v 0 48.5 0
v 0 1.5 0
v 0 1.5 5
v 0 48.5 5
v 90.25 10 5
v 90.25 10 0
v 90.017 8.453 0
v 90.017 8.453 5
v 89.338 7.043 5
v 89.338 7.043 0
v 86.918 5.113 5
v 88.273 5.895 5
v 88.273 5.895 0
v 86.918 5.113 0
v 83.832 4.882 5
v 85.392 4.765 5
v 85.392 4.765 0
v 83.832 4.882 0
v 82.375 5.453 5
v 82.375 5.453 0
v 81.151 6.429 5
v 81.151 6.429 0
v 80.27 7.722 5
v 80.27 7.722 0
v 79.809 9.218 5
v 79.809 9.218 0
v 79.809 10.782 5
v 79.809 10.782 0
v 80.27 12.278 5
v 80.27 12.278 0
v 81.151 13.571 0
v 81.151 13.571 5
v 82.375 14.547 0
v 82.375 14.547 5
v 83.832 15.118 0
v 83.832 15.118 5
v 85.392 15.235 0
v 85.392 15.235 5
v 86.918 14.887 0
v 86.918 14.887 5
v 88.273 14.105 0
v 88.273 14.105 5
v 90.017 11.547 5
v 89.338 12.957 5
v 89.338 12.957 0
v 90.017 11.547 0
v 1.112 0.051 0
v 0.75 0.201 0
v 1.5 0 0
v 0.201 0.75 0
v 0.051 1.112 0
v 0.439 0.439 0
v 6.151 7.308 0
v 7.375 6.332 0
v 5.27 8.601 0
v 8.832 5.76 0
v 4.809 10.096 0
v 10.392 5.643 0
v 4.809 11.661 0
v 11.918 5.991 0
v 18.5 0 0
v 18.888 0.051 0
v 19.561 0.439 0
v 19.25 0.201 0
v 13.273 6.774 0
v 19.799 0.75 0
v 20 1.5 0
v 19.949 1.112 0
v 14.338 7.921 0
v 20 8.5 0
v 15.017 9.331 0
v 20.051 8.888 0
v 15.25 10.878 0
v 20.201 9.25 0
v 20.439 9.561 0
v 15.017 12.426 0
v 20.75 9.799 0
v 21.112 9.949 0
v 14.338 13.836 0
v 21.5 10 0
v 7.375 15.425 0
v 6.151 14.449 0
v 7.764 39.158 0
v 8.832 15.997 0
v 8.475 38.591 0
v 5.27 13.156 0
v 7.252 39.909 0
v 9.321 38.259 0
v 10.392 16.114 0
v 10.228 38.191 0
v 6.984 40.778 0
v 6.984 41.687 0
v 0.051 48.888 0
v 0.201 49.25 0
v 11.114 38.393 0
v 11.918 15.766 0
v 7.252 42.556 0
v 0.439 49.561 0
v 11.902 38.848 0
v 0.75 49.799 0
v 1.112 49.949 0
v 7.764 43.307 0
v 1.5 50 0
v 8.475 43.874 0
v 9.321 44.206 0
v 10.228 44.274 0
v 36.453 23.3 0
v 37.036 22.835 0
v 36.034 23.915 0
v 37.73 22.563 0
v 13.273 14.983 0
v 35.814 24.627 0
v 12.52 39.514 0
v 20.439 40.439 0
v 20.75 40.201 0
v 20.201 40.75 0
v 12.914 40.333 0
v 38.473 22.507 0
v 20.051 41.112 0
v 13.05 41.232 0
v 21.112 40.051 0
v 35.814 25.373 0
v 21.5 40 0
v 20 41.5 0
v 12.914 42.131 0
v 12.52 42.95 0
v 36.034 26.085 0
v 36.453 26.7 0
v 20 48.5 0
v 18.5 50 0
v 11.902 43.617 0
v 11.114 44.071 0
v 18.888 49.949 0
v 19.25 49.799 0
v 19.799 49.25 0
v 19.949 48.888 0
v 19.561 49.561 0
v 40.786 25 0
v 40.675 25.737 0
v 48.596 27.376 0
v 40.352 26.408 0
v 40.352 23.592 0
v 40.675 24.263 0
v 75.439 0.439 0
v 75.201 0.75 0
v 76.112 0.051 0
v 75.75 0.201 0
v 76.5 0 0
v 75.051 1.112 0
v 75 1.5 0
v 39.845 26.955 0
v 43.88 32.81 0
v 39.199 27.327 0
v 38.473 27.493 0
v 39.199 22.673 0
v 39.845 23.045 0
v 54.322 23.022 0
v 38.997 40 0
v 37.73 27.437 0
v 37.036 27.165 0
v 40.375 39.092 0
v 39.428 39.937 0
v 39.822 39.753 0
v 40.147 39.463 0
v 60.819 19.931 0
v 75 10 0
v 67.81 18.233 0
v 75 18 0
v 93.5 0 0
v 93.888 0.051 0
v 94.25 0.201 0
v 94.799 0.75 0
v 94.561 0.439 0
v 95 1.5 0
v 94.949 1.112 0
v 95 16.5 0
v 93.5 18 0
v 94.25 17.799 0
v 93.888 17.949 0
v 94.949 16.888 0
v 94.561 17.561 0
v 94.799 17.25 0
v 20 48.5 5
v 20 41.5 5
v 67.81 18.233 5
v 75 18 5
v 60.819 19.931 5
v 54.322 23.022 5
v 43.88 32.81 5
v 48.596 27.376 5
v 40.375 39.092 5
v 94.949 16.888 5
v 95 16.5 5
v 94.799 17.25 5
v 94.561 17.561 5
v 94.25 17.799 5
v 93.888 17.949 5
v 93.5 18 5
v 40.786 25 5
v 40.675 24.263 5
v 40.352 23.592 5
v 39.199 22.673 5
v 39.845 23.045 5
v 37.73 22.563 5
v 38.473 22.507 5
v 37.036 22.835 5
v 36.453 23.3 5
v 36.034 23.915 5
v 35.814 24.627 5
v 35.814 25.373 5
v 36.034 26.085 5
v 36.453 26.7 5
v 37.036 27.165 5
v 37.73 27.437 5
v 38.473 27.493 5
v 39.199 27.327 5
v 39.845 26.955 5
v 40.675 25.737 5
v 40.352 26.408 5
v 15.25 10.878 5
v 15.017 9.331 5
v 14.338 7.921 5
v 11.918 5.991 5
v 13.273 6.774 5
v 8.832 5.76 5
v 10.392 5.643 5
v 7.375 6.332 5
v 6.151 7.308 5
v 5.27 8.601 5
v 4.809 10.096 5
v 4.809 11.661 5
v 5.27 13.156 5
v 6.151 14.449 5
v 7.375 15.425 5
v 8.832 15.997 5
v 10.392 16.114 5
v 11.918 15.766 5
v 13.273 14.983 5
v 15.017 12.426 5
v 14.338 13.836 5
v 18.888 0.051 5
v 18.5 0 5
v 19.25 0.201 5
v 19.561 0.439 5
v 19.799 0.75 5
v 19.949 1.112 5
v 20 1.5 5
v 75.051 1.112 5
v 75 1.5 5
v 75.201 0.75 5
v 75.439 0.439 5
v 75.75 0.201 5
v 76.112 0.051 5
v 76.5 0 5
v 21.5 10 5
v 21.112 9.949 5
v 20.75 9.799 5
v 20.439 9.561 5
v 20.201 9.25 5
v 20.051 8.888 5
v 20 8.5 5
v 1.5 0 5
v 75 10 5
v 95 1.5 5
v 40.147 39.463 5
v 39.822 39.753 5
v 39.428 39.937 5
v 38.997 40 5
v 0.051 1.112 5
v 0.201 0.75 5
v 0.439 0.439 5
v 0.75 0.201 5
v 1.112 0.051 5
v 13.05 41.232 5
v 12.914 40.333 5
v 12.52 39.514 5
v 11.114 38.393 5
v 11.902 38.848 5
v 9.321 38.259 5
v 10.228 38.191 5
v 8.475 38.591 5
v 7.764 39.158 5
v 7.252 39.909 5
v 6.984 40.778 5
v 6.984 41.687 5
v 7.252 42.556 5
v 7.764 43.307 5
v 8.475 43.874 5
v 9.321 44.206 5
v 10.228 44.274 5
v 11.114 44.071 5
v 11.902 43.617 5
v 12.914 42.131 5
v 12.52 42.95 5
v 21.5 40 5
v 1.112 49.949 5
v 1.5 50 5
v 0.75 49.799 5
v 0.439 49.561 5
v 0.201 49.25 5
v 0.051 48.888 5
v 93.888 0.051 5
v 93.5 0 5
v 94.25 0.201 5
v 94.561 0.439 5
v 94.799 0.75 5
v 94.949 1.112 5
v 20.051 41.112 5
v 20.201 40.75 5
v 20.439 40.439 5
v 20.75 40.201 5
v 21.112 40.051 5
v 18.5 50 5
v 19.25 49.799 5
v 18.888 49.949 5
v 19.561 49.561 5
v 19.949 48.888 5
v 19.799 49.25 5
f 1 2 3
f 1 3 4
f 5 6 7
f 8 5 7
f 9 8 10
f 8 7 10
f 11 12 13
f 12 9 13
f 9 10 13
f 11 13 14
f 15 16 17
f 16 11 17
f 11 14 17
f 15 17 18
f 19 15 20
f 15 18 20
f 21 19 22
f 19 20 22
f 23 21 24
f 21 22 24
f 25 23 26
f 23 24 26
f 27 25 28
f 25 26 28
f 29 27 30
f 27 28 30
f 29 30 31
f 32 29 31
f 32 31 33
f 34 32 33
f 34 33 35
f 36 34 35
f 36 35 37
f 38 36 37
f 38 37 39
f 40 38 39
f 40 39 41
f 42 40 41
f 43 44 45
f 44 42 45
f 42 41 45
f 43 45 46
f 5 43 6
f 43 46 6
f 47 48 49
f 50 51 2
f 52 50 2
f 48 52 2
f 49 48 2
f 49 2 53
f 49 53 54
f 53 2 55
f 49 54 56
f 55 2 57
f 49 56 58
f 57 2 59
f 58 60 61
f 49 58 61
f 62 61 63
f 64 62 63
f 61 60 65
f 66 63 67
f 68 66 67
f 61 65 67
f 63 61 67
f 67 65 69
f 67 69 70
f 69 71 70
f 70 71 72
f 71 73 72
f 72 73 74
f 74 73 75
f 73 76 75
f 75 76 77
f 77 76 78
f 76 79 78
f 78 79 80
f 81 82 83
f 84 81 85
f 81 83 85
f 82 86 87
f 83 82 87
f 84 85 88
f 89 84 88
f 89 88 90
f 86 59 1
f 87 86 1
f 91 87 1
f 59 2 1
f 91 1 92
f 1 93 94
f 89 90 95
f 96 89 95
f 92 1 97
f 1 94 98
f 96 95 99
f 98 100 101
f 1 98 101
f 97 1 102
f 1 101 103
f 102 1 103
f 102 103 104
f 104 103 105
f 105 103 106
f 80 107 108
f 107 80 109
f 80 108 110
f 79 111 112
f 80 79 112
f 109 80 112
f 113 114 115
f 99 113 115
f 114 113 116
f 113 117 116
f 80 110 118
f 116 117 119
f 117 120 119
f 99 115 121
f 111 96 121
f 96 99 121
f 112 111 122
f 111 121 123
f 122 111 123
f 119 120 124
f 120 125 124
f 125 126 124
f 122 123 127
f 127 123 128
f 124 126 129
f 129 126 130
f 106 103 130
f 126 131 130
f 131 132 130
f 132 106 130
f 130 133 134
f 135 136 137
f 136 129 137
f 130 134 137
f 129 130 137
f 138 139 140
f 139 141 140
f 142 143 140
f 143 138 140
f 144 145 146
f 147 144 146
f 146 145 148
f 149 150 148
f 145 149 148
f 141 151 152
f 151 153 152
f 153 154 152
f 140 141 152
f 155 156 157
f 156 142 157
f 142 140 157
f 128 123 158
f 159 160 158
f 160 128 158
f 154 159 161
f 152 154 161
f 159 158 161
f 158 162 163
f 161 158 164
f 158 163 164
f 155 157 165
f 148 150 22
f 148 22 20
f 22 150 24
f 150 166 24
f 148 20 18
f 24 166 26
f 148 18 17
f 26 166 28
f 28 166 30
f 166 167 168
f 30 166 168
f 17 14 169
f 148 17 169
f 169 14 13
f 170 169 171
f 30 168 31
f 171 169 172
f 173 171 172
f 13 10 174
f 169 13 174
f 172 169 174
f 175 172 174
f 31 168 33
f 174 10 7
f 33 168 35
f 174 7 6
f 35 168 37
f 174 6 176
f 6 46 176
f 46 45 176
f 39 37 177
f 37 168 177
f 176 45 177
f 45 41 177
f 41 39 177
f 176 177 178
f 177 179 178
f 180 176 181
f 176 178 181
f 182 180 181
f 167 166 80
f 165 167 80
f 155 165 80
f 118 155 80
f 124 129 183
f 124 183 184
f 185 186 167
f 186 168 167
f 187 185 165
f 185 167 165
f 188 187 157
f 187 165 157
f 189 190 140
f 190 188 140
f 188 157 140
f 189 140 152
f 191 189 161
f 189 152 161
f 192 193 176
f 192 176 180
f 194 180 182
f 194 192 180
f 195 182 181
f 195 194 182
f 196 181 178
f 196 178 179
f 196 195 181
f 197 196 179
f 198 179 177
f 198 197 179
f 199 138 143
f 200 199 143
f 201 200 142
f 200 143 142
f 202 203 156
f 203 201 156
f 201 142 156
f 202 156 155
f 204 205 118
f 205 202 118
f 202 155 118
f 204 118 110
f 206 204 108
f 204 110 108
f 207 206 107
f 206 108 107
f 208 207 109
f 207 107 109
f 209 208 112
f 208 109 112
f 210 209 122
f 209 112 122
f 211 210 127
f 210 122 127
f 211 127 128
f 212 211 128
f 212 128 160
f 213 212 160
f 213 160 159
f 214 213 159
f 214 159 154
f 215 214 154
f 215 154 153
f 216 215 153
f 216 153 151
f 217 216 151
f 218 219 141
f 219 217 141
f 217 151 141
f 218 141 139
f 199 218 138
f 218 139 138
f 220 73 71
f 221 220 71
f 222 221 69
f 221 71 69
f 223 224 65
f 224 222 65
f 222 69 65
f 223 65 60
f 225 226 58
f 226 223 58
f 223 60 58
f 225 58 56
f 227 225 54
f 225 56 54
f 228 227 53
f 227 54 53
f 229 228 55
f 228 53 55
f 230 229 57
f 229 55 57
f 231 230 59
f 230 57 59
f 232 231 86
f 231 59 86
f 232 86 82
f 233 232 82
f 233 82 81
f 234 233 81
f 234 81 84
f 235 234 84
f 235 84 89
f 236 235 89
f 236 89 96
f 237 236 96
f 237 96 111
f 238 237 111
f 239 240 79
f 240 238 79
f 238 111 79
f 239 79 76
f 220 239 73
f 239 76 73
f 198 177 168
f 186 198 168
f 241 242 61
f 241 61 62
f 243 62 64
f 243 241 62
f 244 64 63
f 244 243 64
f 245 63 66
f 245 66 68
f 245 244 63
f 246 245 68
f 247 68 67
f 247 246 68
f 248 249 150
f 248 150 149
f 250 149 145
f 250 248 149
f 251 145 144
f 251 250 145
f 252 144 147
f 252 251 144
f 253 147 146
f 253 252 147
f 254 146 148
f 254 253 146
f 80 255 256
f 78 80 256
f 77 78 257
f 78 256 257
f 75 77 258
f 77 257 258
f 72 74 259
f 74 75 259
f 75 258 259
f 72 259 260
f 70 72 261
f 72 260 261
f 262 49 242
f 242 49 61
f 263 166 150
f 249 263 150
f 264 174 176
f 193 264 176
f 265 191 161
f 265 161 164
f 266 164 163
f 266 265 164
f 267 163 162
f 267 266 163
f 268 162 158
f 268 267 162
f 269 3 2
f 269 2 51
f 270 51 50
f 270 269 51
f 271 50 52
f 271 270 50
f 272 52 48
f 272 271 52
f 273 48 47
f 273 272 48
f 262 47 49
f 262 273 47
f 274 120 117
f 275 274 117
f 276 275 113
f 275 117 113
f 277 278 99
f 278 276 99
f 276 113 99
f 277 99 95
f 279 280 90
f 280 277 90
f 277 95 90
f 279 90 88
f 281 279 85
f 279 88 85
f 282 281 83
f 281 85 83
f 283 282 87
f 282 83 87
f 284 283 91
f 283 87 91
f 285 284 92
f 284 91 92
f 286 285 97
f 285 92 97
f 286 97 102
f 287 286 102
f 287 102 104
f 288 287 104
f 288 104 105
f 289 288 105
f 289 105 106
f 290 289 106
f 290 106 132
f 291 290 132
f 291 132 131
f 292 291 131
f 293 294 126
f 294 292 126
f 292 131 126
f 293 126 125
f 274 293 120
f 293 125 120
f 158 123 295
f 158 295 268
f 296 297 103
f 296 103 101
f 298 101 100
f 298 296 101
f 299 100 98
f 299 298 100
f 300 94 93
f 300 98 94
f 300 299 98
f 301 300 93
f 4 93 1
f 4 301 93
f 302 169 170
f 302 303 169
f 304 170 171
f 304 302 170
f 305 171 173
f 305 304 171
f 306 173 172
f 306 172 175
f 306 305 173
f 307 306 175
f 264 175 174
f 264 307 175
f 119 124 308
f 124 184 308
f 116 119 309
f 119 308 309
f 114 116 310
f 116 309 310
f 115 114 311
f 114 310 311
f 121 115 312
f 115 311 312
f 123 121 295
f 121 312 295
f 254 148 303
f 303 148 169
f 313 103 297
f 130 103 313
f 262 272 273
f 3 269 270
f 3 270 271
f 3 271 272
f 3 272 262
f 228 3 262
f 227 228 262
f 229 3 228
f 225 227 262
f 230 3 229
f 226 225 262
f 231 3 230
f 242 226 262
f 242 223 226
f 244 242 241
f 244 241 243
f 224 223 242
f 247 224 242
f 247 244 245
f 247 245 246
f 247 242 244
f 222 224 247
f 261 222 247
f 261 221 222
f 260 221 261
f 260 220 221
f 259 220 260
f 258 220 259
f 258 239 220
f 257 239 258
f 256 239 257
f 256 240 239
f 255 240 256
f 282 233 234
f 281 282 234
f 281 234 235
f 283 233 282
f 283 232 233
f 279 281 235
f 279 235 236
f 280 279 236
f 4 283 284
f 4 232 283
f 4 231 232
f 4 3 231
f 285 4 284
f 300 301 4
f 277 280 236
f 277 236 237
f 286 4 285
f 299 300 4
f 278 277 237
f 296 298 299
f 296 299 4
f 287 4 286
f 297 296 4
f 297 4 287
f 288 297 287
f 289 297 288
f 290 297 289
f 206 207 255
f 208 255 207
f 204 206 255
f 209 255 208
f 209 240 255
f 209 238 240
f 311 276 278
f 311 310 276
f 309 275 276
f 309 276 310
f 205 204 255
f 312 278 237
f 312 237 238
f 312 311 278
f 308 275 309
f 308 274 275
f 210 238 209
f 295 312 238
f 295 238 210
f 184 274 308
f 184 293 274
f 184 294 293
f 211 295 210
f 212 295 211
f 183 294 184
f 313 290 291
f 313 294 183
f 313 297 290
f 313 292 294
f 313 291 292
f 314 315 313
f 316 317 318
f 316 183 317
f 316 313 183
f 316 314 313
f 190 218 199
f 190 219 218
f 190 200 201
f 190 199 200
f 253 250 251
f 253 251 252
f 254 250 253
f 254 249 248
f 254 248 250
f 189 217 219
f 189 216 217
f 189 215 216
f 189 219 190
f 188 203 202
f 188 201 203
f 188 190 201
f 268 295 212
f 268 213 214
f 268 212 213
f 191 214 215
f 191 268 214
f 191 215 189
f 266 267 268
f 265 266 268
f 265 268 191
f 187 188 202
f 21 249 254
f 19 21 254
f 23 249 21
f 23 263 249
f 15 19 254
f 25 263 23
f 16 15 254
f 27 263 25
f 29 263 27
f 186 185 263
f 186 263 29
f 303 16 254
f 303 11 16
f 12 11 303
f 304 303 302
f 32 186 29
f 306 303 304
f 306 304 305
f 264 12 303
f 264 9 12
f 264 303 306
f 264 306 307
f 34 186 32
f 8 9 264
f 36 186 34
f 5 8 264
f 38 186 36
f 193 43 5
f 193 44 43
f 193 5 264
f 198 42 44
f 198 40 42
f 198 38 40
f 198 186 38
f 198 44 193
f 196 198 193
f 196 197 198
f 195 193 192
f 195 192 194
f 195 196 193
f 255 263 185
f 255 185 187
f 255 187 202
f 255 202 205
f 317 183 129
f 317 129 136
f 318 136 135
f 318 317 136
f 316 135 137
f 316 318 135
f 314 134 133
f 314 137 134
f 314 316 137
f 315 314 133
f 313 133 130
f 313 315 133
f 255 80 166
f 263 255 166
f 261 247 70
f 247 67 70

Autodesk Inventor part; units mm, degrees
ref_plane "YZ Plane" through (0, 0, 0) normal (1, 0, 0) x (0, 1, 0)
ref_plane "XZ Plane" through (0, 0, 0) normal (0, 1, 0) x (-1, 0, 0)
ref_plane "XY Plane" through (0, 0, 0) normal (0, 0, 1) x (1, 0, 0)
sketch "Esboço1" plane through (0, 0, 0) normal (0, 1, 0) x (-1, 0, 0)
  point P0 (0, 0)
sketch "Esboço2" plane through (0, 0, 0) normal (0, 0, 1) x (1, 0, 0)
  line L0 (0, 0) -> (20, 0)
  line L1 (20, 0) -> (20, 10)
  line L2 (20, 10) -> (75, 10)
  line L3 (75, 10) -> (75, 0)
  line L4 (75, 0) -> (95, 0)
  line L5 (95, 0) -> (95, 18)
  line L6 (95, 18) -> (75, 18)
  line L7 (0, 0) -> (0, 50)
  line L8 (0, 50) -> (20, 50)
  line L9 (20, 50) -> (20, 40)
  line L10 (20, 40) -> (40, 40)
  arc A0 (40, 40) -> (75, 18) centre (72.5309, 52.9128) ccw
  circle A1 centre (10, 41.2323) radius 3.05
  circle A2 centre (10, 10.8785) radius 5.25
  circle A3 centre (85, 10) radius 5.25
  circle A4 centre (38.286, 25) radius 2.5
  dimension "d0" = 20
  dimension "d1" = 10
  dimension "d2" = 55
  dimension "d3" = 10
  dimension "d4" = 20
  dimension "d5" = 18
  dimension "d6" = 20
  dimension "d7" = 50
  dimension "d8" = 20
  dimension "d9" = 10
  dimension "d10" = 20
  dimension "d11" = 35
  dimension "d12" = 6.1
  dimension "d13" = 10.5
  dimension "d14" = 10.5
  dimension "d15" = 5
extrude "Extrusão1" add sketch "Esboço2" along normal blind 5
fillet "Arredondamento1" radius 1.5 2 edges at (0, 50, 2.5) (20, 50, 2.5)
fillet "Arredondamento2" radius 1.5 8 edges at (20, 40, 2.5) (40, 40, 2.5) (95, 0, 2.5) (75, 0, 2.5) (20, 0, 2.5) (20, 10, 2.5) (95, 18, 2.5) (0, 0, 2.5)
properties part number "lateralCanhao"
